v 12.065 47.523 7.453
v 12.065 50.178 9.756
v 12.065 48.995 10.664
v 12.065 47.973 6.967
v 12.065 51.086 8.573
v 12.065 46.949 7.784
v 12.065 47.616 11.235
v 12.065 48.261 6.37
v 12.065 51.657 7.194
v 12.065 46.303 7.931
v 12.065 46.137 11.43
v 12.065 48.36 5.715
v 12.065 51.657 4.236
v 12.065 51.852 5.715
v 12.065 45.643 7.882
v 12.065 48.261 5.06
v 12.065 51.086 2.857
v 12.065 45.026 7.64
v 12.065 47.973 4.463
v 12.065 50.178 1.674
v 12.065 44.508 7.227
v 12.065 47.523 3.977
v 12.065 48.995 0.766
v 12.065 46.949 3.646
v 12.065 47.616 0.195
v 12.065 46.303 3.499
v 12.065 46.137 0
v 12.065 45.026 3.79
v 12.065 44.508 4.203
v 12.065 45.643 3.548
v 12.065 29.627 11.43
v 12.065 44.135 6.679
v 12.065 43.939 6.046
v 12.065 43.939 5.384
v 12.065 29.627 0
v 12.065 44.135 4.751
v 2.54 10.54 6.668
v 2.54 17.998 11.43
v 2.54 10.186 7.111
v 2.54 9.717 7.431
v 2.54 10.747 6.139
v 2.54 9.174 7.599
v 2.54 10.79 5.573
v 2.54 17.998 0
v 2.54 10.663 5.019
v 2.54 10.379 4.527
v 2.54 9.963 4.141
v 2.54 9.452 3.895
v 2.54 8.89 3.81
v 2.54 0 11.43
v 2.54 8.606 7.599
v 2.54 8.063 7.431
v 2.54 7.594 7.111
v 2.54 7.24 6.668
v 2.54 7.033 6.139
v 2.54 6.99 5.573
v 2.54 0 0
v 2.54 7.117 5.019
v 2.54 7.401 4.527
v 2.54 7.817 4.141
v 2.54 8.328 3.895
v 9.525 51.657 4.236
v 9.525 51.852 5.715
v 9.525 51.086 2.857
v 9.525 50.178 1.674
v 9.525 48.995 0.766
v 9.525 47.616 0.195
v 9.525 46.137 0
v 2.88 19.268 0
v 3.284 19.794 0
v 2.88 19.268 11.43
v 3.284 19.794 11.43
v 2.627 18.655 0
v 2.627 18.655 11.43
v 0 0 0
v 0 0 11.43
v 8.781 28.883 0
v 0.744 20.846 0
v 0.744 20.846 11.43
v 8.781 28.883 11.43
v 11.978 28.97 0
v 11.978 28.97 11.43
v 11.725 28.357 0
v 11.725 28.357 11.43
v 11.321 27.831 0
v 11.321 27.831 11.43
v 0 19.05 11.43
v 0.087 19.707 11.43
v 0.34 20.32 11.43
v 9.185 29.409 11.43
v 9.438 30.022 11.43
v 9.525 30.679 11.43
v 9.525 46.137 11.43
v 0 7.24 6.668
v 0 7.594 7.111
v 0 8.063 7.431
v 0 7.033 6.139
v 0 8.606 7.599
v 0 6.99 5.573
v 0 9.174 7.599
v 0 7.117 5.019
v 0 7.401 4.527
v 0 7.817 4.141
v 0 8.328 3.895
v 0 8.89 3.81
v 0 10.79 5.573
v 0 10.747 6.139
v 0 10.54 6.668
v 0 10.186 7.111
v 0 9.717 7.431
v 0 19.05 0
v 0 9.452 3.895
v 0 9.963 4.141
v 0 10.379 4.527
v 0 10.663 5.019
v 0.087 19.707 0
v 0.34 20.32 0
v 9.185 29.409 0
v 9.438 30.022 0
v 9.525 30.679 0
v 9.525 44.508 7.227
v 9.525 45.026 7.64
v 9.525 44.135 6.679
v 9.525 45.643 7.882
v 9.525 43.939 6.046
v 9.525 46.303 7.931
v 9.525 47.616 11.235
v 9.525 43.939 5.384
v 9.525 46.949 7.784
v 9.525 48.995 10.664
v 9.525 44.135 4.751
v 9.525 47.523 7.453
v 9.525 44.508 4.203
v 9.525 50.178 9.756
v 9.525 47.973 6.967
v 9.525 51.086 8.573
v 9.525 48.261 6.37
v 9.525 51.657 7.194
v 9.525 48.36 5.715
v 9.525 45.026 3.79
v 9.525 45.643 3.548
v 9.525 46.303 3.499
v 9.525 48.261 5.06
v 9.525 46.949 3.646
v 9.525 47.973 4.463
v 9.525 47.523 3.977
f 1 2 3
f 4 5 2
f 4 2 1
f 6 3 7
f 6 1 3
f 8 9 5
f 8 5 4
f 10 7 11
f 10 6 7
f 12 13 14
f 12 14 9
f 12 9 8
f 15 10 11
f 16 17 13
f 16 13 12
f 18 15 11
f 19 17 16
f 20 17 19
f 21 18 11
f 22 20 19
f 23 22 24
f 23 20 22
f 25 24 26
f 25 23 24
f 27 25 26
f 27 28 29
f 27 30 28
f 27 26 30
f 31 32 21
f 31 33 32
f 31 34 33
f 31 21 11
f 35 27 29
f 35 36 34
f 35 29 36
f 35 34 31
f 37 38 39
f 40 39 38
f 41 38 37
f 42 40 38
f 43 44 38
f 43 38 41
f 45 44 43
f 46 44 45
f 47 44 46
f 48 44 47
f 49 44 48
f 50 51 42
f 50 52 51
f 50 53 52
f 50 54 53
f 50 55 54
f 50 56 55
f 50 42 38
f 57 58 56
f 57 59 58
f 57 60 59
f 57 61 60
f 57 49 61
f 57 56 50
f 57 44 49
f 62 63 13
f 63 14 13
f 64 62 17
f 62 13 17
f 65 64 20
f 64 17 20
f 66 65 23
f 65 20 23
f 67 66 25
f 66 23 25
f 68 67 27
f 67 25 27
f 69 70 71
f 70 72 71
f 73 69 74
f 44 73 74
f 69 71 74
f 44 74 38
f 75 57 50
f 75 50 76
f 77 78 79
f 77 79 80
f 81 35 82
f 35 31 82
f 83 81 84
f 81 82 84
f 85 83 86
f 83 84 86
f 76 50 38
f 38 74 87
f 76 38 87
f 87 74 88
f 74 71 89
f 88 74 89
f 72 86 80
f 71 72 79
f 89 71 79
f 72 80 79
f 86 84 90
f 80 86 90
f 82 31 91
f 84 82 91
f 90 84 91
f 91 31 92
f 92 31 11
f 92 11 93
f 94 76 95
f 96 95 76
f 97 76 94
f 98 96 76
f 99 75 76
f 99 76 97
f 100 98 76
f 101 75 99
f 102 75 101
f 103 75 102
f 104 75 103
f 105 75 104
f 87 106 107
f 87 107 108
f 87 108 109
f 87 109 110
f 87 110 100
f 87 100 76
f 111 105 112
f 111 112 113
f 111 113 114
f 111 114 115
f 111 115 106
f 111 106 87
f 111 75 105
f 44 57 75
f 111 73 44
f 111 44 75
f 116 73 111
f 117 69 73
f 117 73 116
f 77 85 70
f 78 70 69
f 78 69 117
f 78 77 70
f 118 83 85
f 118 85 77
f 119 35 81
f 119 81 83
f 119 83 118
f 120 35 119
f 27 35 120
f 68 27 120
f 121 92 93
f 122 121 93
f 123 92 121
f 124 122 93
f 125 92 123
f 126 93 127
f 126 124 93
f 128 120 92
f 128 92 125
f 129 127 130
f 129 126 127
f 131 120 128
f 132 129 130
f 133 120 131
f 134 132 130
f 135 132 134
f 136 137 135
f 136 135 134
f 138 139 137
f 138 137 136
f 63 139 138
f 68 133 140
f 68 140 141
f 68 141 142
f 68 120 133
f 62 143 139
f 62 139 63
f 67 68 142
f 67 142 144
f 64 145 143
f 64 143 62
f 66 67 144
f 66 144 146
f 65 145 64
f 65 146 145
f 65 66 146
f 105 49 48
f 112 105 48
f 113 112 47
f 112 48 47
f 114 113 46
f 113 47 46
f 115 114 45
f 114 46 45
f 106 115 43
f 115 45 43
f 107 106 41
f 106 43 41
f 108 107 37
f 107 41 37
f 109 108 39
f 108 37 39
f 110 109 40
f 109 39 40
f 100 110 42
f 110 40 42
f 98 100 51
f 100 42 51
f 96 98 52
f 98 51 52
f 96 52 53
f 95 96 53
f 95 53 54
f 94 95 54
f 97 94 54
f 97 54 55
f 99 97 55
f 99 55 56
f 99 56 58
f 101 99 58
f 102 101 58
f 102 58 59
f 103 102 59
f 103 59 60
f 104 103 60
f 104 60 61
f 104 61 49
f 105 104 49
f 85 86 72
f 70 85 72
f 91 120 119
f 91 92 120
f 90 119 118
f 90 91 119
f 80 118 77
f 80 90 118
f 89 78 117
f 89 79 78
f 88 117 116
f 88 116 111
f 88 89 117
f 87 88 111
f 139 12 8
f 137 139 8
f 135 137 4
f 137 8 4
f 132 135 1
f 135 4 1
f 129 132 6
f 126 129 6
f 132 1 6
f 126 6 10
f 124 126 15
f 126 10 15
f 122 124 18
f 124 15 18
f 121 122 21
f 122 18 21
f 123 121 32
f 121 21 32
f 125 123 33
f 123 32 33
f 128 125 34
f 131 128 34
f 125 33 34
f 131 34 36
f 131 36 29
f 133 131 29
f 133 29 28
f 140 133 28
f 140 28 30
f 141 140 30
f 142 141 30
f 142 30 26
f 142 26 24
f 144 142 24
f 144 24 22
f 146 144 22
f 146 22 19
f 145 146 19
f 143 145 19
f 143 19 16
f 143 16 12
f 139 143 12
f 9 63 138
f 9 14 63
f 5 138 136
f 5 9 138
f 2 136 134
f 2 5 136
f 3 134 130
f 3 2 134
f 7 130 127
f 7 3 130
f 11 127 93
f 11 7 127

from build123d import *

# Parameters (mm, degrees)
BOSS_EXTRUDE1_DEPTH = 11.43
FILLET1_R           = 5.715
SKETCH3_R           = 2.2225
SKETCH3_R_2         = 1.905
CUT_EXTRUDE1_DEPTH  = 12.7
FILLET2_R           = 2.54


with BuildPart() as part:
    # Sketch1 → Boss-Extrude1 (new body)
    with BuildSketch(Plane.XY):
        Polygon((0, 0), (0, 20.102102448), (9.525, 29.627102448), (9.525, 51.852102448), (12.065, 51.852102448), (12.065, 28.575), (2.54, 19.05), (2.54, 0), align=None)
    extrude(amount=BOSS_EXTRUDE1_DEPTH)

    # Fillet1
    fillet1_edges = [part.edges().sort_by_distance(p)[0] for p in [
        (10.795, 51.852102448, 0),
        (10.795, 51.852102448, 11.43),
    ]]
    fillet(fillet1_edges, radius=FILLET1_R - 0.0001)  # a hair under: the kernel refuses the full size

    # Sketch3 → Cut-Extrude1 (cut)
    with BuildSketch(Plane(origin=(12.065, 0, 0), x_dir=(0, 0, -1), z_dir=(1, 0, 0))):
        with Locations(Location((-5.715, 46.137102448, 0), (0, 0, 90))):
            Circle(SKETCH3_R)
        with Locations((-5.715, 8.89)):
            Circle(SKETCH3_R_2)
    extrude(amount=-CUT_EXTRUDE1_DEPTH, mode=Mode.SUBTRACT)

    # Fillet2
    fillet2_edges = [part.edges().sort_by_distance(p)[0] for p in [
        (0, 20.102102448, 5.715),
        (9.525, 29.627102448, 5.715),
        (12.065, 28.575, 5.715),
        (2.54, 19.05, 5.715),
    ]]
    fillet(fillet2_edges, radius=FILLET2_R)


solid = part.part
